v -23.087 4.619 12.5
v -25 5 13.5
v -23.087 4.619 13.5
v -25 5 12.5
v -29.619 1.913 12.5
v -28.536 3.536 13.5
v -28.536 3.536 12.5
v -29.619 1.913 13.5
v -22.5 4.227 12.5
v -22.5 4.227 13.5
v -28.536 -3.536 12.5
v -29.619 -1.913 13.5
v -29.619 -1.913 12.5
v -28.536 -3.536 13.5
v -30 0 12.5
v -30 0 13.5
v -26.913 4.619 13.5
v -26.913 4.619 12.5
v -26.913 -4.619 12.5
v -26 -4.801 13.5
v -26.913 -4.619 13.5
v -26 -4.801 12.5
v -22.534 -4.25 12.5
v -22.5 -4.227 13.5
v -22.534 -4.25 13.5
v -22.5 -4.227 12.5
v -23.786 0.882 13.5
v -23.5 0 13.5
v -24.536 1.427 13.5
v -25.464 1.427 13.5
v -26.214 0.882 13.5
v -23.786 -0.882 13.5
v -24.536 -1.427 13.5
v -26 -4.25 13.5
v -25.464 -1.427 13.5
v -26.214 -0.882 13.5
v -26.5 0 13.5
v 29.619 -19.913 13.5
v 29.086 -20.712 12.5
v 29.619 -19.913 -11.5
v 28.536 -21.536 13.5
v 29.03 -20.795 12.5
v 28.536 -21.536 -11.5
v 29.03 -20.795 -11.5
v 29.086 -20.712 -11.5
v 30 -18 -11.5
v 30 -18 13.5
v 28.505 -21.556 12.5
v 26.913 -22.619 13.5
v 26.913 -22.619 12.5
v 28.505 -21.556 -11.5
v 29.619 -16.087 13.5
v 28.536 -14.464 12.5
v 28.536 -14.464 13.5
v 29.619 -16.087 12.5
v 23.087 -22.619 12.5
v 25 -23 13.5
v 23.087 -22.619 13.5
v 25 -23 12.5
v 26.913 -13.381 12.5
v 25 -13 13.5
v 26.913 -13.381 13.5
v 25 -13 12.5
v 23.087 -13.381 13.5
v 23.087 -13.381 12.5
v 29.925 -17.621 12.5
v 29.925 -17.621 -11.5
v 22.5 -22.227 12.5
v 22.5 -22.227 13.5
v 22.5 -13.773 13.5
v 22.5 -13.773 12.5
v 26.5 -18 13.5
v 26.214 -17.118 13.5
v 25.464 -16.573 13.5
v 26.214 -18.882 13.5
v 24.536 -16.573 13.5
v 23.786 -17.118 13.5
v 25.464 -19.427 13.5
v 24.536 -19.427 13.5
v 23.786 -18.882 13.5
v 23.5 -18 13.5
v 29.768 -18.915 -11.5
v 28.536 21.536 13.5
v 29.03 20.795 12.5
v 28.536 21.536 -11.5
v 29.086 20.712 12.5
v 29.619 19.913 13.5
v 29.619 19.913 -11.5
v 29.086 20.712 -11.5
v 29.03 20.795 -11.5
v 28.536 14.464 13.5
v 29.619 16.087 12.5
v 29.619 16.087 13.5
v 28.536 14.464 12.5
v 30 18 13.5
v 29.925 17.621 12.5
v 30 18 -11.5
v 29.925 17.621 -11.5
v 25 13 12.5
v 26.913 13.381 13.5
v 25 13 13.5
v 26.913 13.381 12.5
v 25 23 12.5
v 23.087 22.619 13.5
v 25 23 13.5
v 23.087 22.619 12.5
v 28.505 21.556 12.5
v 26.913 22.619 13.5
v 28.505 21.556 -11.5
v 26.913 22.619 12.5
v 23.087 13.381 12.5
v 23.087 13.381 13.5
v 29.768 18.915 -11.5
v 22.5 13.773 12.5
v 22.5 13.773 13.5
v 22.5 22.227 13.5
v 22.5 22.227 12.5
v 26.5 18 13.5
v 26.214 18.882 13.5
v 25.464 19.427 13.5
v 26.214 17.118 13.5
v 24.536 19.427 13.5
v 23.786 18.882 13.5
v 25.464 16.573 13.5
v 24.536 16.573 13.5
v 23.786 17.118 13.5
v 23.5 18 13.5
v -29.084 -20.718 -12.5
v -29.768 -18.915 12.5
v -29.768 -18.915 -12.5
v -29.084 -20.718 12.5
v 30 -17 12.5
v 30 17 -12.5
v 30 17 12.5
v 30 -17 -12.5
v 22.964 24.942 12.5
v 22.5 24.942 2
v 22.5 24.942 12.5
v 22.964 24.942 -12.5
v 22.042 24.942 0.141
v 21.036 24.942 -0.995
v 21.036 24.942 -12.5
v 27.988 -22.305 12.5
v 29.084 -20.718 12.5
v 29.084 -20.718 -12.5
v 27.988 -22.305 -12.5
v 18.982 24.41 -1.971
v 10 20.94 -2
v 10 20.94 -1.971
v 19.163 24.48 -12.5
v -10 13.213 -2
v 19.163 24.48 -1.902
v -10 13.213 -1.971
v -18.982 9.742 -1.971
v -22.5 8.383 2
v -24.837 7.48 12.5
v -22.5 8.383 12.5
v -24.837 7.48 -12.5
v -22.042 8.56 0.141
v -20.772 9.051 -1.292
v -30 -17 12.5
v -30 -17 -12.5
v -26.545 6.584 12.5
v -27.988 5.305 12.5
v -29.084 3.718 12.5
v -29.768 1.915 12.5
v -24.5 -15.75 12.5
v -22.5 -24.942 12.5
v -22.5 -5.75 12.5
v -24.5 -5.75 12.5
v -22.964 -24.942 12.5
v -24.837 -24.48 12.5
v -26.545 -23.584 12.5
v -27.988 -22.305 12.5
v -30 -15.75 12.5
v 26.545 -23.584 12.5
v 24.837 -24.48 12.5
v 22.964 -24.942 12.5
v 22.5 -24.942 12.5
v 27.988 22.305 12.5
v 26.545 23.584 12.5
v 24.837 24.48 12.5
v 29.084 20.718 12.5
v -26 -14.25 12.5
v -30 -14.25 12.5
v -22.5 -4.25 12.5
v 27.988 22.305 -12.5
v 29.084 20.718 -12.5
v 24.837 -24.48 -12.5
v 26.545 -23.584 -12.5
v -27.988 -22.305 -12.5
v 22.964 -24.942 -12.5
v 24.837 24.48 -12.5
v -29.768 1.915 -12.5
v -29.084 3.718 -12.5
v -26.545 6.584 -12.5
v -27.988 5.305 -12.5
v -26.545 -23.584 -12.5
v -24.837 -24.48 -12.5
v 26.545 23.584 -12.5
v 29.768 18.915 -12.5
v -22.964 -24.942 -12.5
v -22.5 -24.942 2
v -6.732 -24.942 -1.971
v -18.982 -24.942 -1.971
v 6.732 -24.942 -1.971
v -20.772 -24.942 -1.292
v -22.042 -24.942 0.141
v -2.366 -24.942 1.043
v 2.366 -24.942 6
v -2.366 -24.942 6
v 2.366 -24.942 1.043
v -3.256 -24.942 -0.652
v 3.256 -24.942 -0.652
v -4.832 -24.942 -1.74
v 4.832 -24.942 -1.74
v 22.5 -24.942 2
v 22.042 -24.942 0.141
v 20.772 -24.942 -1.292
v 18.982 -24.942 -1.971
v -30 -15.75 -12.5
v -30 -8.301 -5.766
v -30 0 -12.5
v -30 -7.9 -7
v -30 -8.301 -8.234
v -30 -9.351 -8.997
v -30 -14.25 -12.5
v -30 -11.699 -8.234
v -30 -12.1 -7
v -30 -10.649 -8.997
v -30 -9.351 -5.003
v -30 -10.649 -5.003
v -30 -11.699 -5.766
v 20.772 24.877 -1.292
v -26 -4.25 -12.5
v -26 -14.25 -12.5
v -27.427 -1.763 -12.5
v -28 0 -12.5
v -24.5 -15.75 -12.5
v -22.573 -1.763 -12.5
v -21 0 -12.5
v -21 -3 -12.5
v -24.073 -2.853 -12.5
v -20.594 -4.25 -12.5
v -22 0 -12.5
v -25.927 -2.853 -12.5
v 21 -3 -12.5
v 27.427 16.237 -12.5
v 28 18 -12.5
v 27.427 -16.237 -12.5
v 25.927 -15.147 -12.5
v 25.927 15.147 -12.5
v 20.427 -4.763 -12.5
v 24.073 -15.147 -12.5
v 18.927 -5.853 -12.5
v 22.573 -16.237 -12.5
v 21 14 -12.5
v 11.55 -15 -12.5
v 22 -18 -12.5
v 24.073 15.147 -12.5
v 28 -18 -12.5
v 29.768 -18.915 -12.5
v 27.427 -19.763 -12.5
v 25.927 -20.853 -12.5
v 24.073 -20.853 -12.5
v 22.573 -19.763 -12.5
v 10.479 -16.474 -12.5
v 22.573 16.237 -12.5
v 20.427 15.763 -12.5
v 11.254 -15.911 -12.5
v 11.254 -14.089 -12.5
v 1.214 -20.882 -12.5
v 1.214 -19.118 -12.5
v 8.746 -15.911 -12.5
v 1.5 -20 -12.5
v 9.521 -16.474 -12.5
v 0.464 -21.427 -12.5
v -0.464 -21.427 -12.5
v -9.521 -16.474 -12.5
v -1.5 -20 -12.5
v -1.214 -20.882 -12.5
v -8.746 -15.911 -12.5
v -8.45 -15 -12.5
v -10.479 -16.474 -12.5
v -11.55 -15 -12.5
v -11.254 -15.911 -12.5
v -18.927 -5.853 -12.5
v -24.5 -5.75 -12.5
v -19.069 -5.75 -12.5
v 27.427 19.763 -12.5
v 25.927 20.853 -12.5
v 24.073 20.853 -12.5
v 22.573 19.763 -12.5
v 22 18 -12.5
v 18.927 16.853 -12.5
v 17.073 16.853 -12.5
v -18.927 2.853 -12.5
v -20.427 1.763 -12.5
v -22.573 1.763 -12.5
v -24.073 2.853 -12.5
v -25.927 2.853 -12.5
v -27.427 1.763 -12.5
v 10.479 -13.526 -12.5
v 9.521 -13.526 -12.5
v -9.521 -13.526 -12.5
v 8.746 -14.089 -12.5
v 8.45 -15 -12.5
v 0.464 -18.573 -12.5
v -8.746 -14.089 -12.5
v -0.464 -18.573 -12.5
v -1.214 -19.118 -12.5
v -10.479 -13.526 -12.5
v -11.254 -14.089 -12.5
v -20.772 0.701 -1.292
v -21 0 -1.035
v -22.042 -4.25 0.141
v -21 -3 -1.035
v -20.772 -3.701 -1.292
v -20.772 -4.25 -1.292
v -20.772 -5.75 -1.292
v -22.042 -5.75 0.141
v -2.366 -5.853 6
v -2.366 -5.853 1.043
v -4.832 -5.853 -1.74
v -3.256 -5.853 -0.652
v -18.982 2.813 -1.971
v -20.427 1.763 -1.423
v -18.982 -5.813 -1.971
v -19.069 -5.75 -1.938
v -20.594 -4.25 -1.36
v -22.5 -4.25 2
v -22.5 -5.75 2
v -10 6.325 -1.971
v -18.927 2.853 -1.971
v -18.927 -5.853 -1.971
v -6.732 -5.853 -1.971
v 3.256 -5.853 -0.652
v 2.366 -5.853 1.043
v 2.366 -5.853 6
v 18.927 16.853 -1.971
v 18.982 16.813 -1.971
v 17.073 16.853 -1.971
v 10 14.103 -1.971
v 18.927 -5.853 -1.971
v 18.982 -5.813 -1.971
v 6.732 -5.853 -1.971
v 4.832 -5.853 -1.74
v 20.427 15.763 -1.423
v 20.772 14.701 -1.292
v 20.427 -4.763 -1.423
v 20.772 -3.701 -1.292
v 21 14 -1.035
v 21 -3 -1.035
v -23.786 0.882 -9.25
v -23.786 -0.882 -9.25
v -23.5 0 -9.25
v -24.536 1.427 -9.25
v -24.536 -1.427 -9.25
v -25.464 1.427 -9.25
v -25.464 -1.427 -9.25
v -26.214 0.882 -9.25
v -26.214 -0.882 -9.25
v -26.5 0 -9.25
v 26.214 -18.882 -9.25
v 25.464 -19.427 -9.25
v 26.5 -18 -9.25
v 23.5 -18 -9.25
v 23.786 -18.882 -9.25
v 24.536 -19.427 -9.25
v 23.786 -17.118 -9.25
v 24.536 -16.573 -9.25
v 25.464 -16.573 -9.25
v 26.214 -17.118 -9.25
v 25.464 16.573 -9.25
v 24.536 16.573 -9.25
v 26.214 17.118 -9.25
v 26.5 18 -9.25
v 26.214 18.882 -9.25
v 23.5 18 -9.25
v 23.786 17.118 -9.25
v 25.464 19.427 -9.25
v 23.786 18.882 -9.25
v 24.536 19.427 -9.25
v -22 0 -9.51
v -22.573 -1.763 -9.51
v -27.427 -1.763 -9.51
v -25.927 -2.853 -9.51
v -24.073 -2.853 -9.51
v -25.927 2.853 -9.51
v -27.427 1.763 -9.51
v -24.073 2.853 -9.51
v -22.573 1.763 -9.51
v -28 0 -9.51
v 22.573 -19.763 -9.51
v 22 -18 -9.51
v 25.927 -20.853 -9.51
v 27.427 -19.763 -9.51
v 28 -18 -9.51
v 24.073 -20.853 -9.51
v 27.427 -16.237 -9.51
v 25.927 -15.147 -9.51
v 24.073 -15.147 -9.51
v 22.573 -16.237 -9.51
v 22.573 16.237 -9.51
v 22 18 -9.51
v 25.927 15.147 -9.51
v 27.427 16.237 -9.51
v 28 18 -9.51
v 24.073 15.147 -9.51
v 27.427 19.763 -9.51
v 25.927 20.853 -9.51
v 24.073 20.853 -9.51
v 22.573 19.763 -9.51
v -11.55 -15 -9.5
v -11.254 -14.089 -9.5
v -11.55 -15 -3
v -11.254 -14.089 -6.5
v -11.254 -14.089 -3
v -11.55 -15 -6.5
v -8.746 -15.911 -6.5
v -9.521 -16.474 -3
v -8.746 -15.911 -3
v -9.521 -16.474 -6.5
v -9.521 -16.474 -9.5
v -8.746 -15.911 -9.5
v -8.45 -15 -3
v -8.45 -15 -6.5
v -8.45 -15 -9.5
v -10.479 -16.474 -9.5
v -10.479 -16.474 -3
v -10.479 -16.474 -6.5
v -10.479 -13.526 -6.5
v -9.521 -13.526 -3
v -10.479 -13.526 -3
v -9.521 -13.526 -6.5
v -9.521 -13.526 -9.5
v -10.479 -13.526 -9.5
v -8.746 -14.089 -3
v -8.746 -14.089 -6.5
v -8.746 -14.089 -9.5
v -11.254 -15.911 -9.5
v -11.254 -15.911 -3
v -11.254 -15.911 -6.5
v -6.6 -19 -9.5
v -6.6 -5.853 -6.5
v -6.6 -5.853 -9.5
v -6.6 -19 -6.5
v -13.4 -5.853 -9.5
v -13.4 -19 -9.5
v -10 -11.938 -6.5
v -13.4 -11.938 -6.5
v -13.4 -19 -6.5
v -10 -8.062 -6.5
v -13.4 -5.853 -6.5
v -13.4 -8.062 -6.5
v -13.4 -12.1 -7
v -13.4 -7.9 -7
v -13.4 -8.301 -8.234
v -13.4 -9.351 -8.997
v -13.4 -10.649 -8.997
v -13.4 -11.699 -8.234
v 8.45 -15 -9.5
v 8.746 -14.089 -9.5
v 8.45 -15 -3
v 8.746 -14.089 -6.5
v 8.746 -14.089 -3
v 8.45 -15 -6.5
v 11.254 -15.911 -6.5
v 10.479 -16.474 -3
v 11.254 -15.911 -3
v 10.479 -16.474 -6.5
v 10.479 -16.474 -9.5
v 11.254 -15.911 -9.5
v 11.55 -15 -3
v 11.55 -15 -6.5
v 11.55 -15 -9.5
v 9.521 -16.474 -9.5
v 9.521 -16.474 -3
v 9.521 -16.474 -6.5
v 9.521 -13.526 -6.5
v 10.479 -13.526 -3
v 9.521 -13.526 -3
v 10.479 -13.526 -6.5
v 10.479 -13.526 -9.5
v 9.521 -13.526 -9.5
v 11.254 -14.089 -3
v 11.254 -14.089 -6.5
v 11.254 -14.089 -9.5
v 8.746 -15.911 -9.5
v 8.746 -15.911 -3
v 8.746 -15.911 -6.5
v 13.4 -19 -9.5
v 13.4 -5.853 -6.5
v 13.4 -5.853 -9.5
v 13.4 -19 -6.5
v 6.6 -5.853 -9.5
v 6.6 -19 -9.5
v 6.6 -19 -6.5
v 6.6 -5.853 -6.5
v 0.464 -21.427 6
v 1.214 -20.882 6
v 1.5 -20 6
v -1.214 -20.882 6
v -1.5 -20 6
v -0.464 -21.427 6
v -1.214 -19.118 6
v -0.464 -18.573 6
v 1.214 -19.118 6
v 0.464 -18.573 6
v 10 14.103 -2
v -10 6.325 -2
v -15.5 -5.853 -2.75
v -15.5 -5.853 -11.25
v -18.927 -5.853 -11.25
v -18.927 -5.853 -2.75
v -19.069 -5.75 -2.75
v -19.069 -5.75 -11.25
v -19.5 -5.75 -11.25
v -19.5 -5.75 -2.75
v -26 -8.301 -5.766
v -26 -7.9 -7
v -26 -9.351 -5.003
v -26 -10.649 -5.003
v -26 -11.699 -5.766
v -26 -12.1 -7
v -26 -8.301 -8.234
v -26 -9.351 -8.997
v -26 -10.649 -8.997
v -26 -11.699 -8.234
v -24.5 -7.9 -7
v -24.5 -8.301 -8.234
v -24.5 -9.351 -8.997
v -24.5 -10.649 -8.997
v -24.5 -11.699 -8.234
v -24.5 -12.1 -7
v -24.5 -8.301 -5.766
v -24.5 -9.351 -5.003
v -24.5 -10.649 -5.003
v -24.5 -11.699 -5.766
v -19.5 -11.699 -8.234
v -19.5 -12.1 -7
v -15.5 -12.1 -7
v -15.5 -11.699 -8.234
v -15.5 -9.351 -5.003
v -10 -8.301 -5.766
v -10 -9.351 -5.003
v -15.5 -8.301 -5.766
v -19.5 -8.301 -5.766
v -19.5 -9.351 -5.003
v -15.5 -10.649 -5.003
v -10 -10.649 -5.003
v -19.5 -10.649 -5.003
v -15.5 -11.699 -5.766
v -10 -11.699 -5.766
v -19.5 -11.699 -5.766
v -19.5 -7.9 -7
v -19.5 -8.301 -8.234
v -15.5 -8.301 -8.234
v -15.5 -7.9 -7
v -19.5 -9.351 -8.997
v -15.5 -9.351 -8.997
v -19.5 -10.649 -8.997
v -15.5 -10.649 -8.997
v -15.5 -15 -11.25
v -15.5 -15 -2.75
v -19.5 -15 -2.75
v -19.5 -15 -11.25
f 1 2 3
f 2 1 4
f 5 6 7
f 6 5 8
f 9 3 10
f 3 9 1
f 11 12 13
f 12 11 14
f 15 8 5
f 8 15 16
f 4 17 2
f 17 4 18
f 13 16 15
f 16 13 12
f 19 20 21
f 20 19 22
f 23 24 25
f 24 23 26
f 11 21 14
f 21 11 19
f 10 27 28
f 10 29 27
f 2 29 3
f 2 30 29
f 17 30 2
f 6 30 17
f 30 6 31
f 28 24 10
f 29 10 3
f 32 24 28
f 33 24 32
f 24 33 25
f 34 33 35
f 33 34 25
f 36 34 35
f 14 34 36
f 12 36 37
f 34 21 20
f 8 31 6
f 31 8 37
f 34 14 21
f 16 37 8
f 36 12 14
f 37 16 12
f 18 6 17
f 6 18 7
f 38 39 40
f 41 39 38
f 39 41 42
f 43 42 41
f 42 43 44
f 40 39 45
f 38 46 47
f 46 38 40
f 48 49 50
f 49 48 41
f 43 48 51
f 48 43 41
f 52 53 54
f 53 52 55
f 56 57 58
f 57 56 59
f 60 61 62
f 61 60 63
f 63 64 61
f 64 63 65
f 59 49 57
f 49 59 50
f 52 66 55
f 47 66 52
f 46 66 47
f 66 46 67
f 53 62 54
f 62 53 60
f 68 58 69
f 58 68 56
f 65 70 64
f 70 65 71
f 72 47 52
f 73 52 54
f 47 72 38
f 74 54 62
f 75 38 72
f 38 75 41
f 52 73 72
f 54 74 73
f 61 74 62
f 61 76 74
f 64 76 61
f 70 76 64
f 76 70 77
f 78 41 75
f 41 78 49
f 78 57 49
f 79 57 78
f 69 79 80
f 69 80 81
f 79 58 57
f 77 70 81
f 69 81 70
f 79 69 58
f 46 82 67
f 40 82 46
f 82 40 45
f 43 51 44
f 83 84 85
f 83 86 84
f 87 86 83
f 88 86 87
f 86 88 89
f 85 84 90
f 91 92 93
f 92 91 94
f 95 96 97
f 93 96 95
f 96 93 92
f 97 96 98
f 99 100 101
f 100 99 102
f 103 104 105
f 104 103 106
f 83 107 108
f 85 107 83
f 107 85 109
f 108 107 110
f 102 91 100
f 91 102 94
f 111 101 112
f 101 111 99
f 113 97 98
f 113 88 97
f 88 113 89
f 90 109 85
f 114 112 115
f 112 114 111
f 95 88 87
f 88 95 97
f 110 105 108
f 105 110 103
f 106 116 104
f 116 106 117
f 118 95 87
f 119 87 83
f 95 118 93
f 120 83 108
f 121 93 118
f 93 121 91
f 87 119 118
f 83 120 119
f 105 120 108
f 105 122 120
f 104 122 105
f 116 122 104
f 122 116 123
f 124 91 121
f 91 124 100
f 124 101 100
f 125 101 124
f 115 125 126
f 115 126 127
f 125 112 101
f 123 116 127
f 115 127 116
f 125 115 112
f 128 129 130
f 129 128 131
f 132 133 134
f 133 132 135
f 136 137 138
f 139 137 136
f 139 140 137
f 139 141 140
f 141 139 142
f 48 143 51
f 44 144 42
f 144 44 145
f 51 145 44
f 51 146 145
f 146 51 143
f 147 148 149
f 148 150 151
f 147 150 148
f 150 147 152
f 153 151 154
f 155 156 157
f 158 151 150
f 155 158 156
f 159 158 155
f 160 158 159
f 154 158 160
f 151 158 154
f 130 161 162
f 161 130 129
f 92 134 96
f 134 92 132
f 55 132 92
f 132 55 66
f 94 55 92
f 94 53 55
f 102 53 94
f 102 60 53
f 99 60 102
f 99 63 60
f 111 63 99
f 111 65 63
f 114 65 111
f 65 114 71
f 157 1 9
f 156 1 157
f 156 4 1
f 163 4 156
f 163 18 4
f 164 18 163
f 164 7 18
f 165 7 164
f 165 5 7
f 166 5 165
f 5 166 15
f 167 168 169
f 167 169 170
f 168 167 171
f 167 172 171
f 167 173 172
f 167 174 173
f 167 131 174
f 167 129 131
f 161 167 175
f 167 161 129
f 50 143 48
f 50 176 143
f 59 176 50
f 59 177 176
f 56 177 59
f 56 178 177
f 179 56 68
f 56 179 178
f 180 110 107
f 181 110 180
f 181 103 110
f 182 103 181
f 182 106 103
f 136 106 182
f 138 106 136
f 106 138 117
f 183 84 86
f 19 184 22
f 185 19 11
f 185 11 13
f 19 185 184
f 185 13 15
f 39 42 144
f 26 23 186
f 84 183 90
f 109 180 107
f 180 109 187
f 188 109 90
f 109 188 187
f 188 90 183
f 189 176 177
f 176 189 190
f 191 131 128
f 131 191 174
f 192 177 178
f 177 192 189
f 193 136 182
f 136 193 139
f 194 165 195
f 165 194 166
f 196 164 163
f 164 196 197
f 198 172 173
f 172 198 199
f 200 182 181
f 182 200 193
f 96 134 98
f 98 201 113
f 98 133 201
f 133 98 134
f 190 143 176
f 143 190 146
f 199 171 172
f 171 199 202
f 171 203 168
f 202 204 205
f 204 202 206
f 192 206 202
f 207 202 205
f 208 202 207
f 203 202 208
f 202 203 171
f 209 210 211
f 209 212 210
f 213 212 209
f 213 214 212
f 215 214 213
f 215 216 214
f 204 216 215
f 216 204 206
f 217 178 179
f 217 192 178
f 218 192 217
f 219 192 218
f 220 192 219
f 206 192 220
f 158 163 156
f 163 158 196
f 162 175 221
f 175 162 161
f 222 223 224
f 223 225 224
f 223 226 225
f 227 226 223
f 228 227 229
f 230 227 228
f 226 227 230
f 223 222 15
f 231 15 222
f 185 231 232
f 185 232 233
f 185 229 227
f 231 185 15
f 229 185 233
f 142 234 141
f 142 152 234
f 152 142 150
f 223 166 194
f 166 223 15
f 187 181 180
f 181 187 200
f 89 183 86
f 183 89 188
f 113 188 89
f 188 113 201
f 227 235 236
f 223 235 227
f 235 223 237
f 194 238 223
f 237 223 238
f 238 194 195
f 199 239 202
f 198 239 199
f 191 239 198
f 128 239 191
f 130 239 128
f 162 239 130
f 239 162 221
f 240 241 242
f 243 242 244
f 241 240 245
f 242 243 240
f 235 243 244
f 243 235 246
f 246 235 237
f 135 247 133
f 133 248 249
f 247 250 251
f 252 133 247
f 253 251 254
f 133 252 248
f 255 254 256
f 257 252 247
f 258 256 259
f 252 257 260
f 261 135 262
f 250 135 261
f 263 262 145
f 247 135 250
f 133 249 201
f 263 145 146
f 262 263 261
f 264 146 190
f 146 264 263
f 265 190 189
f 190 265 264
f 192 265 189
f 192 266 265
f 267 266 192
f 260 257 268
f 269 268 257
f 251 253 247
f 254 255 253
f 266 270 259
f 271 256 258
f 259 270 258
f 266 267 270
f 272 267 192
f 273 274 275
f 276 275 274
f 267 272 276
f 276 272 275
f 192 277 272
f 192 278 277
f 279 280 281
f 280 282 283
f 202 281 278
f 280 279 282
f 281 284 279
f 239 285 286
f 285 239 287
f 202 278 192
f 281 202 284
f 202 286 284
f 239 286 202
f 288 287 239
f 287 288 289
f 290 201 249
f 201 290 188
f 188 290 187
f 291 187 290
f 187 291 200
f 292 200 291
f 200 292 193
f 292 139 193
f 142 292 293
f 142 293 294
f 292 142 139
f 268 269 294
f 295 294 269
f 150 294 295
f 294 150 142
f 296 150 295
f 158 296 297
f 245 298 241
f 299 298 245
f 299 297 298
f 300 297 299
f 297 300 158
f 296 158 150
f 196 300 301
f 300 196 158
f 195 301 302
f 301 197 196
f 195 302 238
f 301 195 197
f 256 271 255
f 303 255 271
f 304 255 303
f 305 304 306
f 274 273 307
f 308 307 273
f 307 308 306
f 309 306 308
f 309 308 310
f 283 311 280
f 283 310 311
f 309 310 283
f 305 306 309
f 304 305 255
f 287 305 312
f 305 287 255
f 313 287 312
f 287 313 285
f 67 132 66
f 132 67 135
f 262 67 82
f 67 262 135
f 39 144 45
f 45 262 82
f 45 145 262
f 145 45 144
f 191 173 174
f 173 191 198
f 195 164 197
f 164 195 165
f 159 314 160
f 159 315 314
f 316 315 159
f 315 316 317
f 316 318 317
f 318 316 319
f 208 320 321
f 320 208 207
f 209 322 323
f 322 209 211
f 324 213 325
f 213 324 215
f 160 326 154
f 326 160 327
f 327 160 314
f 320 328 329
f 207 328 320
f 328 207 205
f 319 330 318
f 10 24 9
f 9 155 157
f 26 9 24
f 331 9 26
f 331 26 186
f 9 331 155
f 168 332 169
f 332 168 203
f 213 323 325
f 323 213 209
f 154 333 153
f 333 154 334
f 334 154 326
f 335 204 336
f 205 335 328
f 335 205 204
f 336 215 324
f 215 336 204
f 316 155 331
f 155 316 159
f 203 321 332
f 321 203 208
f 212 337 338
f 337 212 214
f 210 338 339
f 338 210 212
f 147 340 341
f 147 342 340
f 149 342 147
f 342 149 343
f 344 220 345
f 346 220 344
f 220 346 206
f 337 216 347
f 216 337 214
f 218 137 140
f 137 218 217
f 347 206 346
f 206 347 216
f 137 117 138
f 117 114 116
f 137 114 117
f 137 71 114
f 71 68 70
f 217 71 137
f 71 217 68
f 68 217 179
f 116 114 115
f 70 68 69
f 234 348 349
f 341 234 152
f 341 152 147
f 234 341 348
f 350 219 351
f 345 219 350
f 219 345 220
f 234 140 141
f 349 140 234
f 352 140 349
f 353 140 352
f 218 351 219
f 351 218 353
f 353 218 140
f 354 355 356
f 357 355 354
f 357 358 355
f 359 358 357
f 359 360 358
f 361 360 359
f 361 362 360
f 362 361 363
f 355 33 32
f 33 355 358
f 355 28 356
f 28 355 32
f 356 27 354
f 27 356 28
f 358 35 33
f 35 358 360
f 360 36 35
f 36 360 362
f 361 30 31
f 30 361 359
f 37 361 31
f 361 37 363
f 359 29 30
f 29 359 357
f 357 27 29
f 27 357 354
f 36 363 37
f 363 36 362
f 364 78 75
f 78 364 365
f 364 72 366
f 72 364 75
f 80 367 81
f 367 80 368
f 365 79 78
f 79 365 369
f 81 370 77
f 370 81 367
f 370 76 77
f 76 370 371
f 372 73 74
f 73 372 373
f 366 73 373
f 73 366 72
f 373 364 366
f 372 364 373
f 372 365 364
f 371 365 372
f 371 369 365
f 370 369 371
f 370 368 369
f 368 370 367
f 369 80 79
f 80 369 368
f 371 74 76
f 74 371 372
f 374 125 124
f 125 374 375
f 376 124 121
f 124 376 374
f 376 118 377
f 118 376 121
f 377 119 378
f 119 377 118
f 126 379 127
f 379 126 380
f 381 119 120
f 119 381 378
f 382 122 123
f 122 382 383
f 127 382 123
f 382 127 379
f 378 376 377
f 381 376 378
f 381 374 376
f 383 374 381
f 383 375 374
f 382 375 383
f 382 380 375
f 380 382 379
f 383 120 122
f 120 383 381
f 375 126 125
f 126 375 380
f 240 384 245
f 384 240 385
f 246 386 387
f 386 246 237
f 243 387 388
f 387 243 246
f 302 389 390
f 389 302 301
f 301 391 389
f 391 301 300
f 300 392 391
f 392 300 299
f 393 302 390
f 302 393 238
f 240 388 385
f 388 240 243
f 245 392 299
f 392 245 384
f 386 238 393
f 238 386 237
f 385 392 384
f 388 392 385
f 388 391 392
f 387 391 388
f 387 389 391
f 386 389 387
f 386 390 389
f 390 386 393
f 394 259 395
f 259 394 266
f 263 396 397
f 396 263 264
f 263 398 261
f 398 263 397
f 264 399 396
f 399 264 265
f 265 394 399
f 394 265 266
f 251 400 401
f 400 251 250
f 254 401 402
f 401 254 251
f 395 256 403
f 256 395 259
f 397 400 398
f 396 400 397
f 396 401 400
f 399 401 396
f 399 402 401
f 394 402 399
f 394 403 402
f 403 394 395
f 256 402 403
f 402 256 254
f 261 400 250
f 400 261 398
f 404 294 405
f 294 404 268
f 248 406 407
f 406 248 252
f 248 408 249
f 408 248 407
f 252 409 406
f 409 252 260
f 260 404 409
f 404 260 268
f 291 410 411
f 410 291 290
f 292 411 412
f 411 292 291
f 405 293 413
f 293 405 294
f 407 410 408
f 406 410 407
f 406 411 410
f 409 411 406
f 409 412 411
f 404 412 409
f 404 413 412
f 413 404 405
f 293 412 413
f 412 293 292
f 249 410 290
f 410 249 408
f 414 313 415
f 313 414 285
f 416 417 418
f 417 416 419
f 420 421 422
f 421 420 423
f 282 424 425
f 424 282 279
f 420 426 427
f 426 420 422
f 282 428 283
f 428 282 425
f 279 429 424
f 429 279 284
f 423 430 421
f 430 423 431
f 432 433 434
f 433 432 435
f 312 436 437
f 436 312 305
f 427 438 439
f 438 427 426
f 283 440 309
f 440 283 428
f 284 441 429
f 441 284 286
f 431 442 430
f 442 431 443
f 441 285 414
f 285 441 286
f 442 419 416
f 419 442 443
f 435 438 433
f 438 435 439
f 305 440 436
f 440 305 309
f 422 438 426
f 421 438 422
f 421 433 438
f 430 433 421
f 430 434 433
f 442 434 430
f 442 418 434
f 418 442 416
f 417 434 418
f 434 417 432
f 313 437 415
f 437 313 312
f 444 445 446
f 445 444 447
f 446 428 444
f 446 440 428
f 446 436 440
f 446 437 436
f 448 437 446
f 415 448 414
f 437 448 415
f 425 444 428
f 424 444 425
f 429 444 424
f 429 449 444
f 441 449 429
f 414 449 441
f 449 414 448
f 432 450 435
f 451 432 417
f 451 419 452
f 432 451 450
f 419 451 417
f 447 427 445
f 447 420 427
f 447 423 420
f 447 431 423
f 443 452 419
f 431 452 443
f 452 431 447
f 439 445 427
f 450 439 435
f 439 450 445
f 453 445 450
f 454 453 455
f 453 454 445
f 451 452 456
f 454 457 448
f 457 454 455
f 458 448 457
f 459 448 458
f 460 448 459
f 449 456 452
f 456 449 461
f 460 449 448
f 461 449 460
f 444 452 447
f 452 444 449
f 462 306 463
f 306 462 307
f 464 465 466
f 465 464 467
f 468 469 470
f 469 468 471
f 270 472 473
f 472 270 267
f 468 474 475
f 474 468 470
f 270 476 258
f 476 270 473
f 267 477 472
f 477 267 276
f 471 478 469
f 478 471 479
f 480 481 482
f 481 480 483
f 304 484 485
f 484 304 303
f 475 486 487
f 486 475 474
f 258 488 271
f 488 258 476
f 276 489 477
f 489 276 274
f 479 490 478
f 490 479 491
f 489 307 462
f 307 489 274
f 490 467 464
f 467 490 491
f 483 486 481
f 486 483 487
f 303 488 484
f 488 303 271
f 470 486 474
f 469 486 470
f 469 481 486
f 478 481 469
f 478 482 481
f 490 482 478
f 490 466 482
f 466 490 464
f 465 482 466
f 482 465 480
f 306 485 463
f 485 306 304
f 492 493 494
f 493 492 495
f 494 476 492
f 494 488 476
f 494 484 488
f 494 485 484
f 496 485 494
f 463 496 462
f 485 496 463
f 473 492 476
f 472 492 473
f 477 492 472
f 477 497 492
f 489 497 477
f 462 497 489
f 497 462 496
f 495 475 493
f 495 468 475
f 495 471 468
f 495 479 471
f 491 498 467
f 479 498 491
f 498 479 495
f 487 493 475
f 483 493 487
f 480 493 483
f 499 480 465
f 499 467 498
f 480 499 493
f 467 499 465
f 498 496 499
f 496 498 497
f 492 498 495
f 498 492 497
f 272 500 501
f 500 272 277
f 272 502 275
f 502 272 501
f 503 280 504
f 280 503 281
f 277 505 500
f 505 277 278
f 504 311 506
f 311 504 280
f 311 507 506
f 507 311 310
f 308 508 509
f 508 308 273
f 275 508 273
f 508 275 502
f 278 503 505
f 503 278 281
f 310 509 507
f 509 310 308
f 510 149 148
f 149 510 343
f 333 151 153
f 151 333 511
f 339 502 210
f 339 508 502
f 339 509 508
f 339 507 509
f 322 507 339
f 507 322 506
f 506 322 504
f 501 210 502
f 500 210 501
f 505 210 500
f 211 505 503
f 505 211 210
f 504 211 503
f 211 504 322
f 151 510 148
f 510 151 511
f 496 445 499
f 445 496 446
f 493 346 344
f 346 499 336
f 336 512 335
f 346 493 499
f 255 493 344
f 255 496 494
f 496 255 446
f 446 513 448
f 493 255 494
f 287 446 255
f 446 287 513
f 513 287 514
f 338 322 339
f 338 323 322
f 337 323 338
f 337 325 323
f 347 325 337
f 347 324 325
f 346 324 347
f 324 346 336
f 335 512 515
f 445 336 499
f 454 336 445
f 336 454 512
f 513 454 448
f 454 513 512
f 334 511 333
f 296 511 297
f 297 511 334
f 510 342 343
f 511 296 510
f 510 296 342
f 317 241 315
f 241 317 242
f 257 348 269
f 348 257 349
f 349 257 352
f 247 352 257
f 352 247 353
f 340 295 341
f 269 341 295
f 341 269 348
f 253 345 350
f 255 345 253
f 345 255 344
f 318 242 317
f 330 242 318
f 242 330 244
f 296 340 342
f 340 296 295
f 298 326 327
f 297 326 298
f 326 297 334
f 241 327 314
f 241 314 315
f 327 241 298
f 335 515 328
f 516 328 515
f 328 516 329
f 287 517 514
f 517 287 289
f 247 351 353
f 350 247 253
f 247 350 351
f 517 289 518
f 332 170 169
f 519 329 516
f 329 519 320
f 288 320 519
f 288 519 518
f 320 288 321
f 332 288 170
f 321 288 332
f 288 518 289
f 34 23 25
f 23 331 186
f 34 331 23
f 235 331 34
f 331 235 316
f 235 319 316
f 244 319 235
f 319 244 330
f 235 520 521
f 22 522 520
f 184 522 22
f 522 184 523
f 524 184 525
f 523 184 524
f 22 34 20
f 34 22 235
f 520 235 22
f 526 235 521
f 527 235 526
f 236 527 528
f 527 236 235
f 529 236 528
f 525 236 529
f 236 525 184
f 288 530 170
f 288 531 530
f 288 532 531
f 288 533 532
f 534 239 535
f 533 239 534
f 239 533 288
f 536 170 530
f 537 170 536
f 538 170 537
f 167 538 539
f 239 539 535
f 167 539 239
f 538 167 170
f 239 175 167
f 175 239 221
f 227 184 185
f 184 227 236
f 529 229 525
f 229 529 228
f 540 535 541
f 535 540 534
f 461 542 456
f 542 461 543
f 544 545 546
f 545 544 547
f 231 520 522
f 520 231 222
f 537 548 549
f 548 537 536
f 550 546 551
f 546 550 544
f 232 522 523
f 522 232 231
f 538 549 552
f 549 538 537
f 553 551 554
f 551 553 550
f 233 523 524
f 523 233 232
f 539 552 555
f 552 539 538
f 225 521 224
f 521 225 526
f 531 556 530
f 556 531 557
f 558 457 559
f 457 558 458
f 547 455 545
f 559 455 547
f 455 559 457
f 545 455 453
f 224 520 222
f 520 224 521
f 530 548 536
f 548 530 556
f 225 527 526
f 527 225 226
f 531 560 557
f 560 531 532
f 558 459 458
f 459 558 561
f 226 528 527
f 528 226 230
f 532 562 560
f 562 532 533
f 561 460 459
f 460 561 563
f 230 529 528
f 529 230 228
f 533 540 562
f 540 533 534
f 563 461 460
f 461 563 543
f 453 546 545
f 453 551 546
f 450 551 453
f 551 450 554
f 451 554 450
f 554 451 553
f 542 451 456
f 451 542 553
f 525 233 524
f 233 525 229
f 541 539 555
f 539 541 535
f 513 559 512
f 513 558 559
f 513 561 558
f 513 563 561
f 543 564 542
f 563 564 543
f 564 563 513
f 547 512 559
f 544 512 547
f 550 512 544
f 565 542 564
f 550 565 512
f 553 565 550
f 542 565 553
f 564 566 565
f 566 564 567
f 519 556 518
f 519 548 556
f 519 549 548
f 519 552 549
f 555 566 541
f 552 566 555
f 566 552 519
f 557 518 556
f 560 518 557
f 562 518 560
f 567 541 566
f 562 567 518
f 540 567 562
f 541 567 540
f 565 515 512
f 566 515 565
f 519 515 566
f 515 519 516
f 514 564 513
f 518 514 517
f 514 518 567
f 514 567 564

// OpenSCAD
// file: metric-cerberus.scad
include <config.scad>

module extrusion4040(h=1000) {
  translate([-20,-20,0])
    linear_extrude(height=h) import("extrusion.dxf");
}

module endstop(h = endstop_height, w = endstop_width, d = endstop_depth,
               r = endstop_hole_diameter/2, ehh = endstop_hole_height,
               ehw = endstop_hole_width,
               eth = endstop_trigger_height, etw = endstop_trigger_width,
               etd = endstop_trigger_depth, eto = endstop_trigger_offset,
               ) {
  difference() {
    translate([0, 0, h/2]) cube([w, d, h], center = true);
    for (i=[1,-1])
      translate([i*endstop_hole_width, 0, ehh])
        rotate([90,0,0]) cylinder(r = r, h = endstop_depth+1, center = true, $fn = 12);
  }
  translate([eto, 0, h+eth/2]) color("Red")
    cube([etw, etd, eth], center = true);
}

module mushroom(min_slot_width = 7.5, max_slot_width = 9,
                slot_depth = 5, inner_width = 12,
                mushroom_depth = 11.75, mushroom_depth_1 = 7,
                mushroom_depth_2 = 9.5, mushroom_width_2 = 15.5,
                max_mushroom_width = 18.5, min_mushroom_width = 10,
                mushroom_lip_width = 2,
                mushroom_lip_depth = 1,
                width = 40, h = 40, margin = .5) {
  translate([0, -width/2, 0])
  linear_extrude(h=h, convexity = 8)
    polygon(points=[
      [-(max_slot_width/2+margin), 0-margin],
      [-min_slot_width/2, (max_slot_width-min_slot_width)/2],
      [-min_slot_width/2, slot_depth-(max_slot_width-min_slot_width)/2],
      [-max_slot_width/2, slot_depth],

      [-(max_mushroom_width/2-mushroom_lip_width), slot_depth],
      [-(max_mushroom_width/2-mushroom_lip_width), slot_depth-mushroom_lip_depth],
      [-max_mushroom_width/2, slot_depth-mushroom_lip_depth],

      [-max_mushroom_width/2, mushroom_depth_1],
      [-mushroom_width_2/2, mushroom_depth_2],
      [-min_mushroom_width/2, mushroom_depth],

      [min_mushroom_width/2, mushroom_depth],
      [mushroom_width_2/2, mushroom_depth_2],
      [max_mushroom_width/2, mushroom_depth_1],

      [max_mushroom_width/2, slot_depth-mushroom_lip_depth],
      [(max_mushroom_width/2-mushroom_lip_width), slot_depth-mushroom_lip_depth],
      [(max_mushroom_width/2-mushroom_lip_width), slot_depth],
      [max_slot_width/2, slot_depth],
      [min_slot_width/2, slot_depth-(max_slot_width-min_slot_width)/2],
      [min_slot_width/2,  (max_slot_width-min_slot_width)/2],
      [(max_slot_width/2+margin), 0-margin],
    ]);
}

module extrusion4040_no_hole(h=40, corner_radius = 4, width = 40,
                             mushroom_angles = [0, 90, 180, 270]) {
  half = width/2;
  offset = half-corner_radius;
  difference() {
    hull() {
      for (i=[1,-1]) {
        for (j=[1,-1]) {
          translate([i*offset*extrusion_scale, j*offset*extrusion_scale, 0])
            cylinder(r=corner_radius*extrusion_scale, h = h, $fn = 30);
        }
      }
    }
    for (r=mushroom_angles) {
      rotate([0,0,r]) translate([0,0,-.5]) mushroom(h=h+1);
    }
  }
}

module fixing_bar(length = 320, height = 25, thickness = 2.5,
                  hole_radius = 4.2/2, hole_offset = 19) {
  rotate([0, 0, -30])
    translate([-(thickness/2+20.2), -(length/2+8.5), height/2])
      difference() {
        cube([thickness, length, height], center = true);
        for (i=[1,-1]) {
          translate([0,i*(length/2-hole_offset),0])
            rotate([0,90,0])
              cylinder(r=hole_radius, h=thickness+2, center = true, $fn = 24);
        }
      }
}

module slots_for_bars(h = 25.8, hole_diameter = 4.2) {

  for (i=[1,-1]) {
    // slots for bars
    rotate([0, 0, i*30]) translate([i*21.5, -57.5, h/2])
      cube([3, 100, h], center = true);

    // cutouts beside bars
    rotate([0, 0, i*30]) translate([i*26, -65, h/2])
      cube([10, 100, h], center = true);

    // holes to secure bar
    translate([i*30.95, -13.95, h/2])
      rotate([0, 90, i*30])
        cylinder(r=hole_diameter/2, h=38, $fn = 12, center = true);
  }
}

module tripod_cutout(h=20) { // used by upper bracket
  translate([0,-25,h/2+15.6]) cube([30,20,h], center = true);
  difference() {
    translate([0,-19,h/2 + 15.6]) cube([40,10,h], center = true);
    translate([21.5,-19,(h+2)/2 + 15.6]) rotate([0,0,30]) cube([10,10,h+2], center = true);
    translate([-21.5,-19,(h+2)/2 + 15.6]) rotate([0,0,-30]) cube([10,10,h+2], center = true);
  }
}

module outer_brace_upper_bracket(h = outer_brace_upper_bracket_height,
                                 endstop_hole_width = endstop_hole_width,
                                 endstop_hole_diameter = endstop_hole_diameter)
{
  difference() {
    union() {
      translate([0, -.5, h/2])
        cylinder(r=32, h = h, center = true);
      for (i=[1,-1])
        rotate([0,0,i*30]) translate([0, -20, h/2])
          cube([46, 55, h], center = true);
    }

    // cut for extrusion
    translate([0, 0, -1])
      extrusion4040_no_hole(h=40, mushroom_angles = [90,180,270]);

    // cut to form outer face
    translate([0, 47, 29]) cube([100, 40, 60], center=true);

    // cut to form inner face
    translate([0, -47, 29]) cube([100, 40, 60], center=true);

    // cut to form top face
    translate([0, 100/2-40/2, 60/2+h]) cube([100, 100, 60], center=true);

    translate([0, 0, 5.3]) slots_for_bars();

    // end stop holes
    for (i=[1,-1]) {
      translate([i*endstop_hole_width+endstop_trigger_offset, -15, 3.7])
        rotate([90,0,0]) cylinder(r=endstop_hole_diameter/2, h=20, $fn=12);
    }

    // other holes
    translate([-13,-15,10.5]) rotate([90,0,0]) cylinder(r=1.5, h=20, $fn=12);
    translate([13,-15,10.5]) rotate([90,0,0]) cylinder(r=1.5, h=20, $fn=12);

    // cutout for tripod
    tripod_cutout(h=21);
  }
}

module outer_brace_bottom_bracket(h = 38) {
  difference() {
    union() {
      translate([0, -.5, 22.5])
        cylinder(r=32, h = 45, center = true);
      for (i=[1,-1])
        rotate([0,0,i*30]) translate([0, -20, 19])
          cube([46, 55, 38], center = true);
    }

    // cut for extrusion
    translate([0, 0, base_thickness]) extrusion4040_no_hole(h=60);

    // cut to form outer face
    translate([0, 47, 29]) cube([100, 40, 60], center=true);

    // cut to form inner face
    translate([0, -47, 29]) cube([100, 40, 60], center=true);

    // cut to form top face
    for (i=[-1,1]) {
      translate([i*43, 100/2-40/2, 60/2+38.1]) rotate([0,0,i*45])
        cube([100, 100, 60], center=true);
    }

    translate([0, 0, 7.6]) slots_for_bars();
  }
}

module outer_brace_bottom_jig(h = 25.4, hole_diameter = 4.2) {
  intersection() {
    difference() {
      outer_brace_bottom_bracket();
      translate([500,0,500-.1]) cube([1000,1000,1000], center = true);
      translate([-30.95, -13.95, 7.6+h/2])
        rotate([0, 90, -30])
        cylinder(r=hole_diameter/2, h=100, $fn = 12, center = true);

    }
    translate([-30.95, -13.95, 7.6+h/2])
      rotate([0, 90, -30])
        translate([0,2,12]) cube([10,6,24], center = true);
  }
  translate([-30.95, -13.95, 0])
    rotate([0, 0, -30]) {
      translate([3,0,(7.6+h/2)/2-2]) cube([6,2,7.6+h/2-4], center = true);
      translate([21,0,(7.6+h/2)/2-2]) cube([6,2,7.6+h/2-4], center = true);
      translate([12, 1.5, -1]) cube([24,5,2], center = true);
    }
}

module upper_idler_adjuster_body(h = 60) {
  
  corner_radius=4;
  width=40;
  half_width=width/2;
  offset = half_width-corner_radius;

  difference() {
    // main block
    hull() {
      for (a=[[offset, offset, h/2],[offset, -offset, h/2],
              [-offset, -offset, h/2],[-offset, offset, h/2]]) {
        translate(a) cylinder(r=4, h=h, center = true);
      }
    }
    // cut for extrusion
    translate([0, 0, h-10]) extrusion4040_no_hole(h=h);

    // hollow
    difference() {
      translate([-4.95, 0, 3+(50+30)/2]) cube([26.75,21,50+30], center = true);
      for (i=[-1,1])
        translate([-4.95, i*(8/2+4.8), 3+(50+30)/2]) cube([4.5,8,50+30], center = true);
    }
    // hole
    translate([-12.8,0,0]) cylinder(r=2, h=10, center = true, $fn = 12);

    // slot
    translate([-19,0,20]) {
      translate([0, 0, 100/2]) cube([5, 8, 100], center = true);
      rotate([0,90,0]) cylinder(r = 4, h = 5, center = true, $fn=24);
    }
    translate([-8, 0, h]) cube([26.75,21,20], center = true);

  }
}

module upper_idler_adjuster_axle(h = 16, r = 4, base_r = 10, base_h = 1) {
  cylinder(r=base_r, h=base_h);
  cylinder(r=r, h=h);
}

module tripod_brace_bottom_to_print() {
    import("Cerberus/stl/Tripod Brace Bott with Motor Mount - for snap fit lower idler.stl");
}

module tripod_brace_bottom() {
  rotate([0,180,0])
    translate([-54.25,-57,-30])
    import("Cerberus/stl/Tripod Brace Bott with Motor Mount - for snap fit lower idler.stl");
}

module tripod_brace_top() {
  rotate([0,0,-43.4])
    translate([-81.35,64,0])
    import("Cerberus/stl/Tripod Brace Top v2.stl");
}

module vert_carriage_for_623_dual_bearing_roller_to_print() {
  import("Cerberus/stl/Vert carriage for 623 Dual Bearing Roller.stl");
}

module vert_carriage_for_623_dual_bearing_roller() {
  rotate([0,0,180]) translate([-5.5, 32, 0]) rotate([90, 0, 0])
    import("Cerberus/stl/Vert carriage for 623 Dual Bearing Roller.stl");
}

module tripod_hole_jig(h = 15+(45-base_thickness),
                       r = 5.2/2, w = 40) {
  difference() {
    union() {
      difference() {
        cube([w+4, h+r+base_thickness+2, 8], center = true);
        translate([0, 1.5, base_thickness])
          cube([w*extrusion_scale, h+r+2+1, 6], center = true);
      }
      cube([7.5, h+r+base_thickness+2, 8], center = true);
    }
    translate([0, h/2-2, 0]) cylinder(r = r, h = 20, $fn = 18, center = true);
  }
}
// file: config.scad
diameter=392;
bar_length=.95*cos(30)*diameter; // 322
bar_height=25;
bar_scale = 1.02; // allow extra space to fit
bar_thickness=2.5;
extrusion_length = 1000;
extrusion_width = 40;
extrusion_scale = 1.02; // allow extra space to fit

// outer brace upper bracket configuration
outer_brace_upper_bracket_height = 35.6;
endstop_hole_diameter = 2.2; // should be drill size but slightly bigger works
// distance from center of hole to center of endstop
endstop_hole_width = 4.75;
// distance from center of trigger to center of endstop
endstop_trigger_offset = 3.125;

// these are not required for printing just for the model
endstop_hole_height = 1.5+2.5/2;
endstop_width = 20;
endstop_height = 10.75;
endstop_depth = 6.5;
endstop_trigger_width = 1.75;
endstop_trigger_height = 1.25;
endstop_trigger_depth = 2.5;

// outer brace bottom bracket configuration
base_thickness = 2.55; // height of bottom of extrusion above ground
// main file
// EXPERIMENTAL: DO NOT PRINT UNLESS YOU ARE HAPPY TO WASTE PLASTIC
// EXPERIMENTAL: DO NOT PRINT UNLESS YOU ARE HAPPY TO WASTE PLASTIC
// EXPERIMENTAL: DO NOT PRINT UNLESS YOU ARE HAPPY TO WASTE PLASTIC
// EXPERIMENTAL: DO NOT PRINT UNLESS YOU ARE HAPPY TO WASTE PLASTIC

include <config.scad>;
use <metric-cerberus.scad>;
to_print = 1;
layer_height = .25; // to add a layer of bridging support to the bearing holes
roller_diameter = 13.3; // on flat part
roller_width = 11;

if (0) {
  translate([0,19.5,2]) #vert_carriage_for_623_dual_bearing_roller();
}

module vert_carriage(extrusion_width = 40, spacing = 2.5, curvature = 8)
{
  width = extrusion_width+20;
  height = 50;
  depth = 25;
  hole_offset = extrusion_width/2+5;
  vert_hole_offset = 36;
  cut_width = extrusion_width+spacing;
  center_width = 4.5;
  adjustment_slit_width = 1.5;
  end_stop_block_width = 25;
  end_stop_screw_hole_diameter = 0; // 3.5mm (m4 tap) or 0 (no hole)
  end_stop_block = 0;

  difference() {

    union() {
      // main body
      hull() {
        translate([(width/2-curvature), 0, 1*(height/2-curvature)])
          rotate([90,0,0]) cylinder(r=curvature, h = depth, center = true);
        translate([(width/2-curvature), 0, -1*(height/2-curvature)])
          rotate([90,0,0]) cylinder(r=curvature, h = depth, center = true);
        translate([-(width/2-curvature), 0, (height/2-curvature)])
          rotate([90,0,0]) cylinder(r=curvature, h = depth, center = true);
        translate([-(width/2-curvature), 0, 0*(height/2-curvature)])
          rotate([90,0,0]) cylinder(r=curvature, h = depth, center = true);
      }

      // end stop screw block
      if (end_stop_block) {
        translate([0, -4, 18])
          cube([end_stop_block_width, 17, 26], center = true);
      }

      // bearing supports
      for (t = [[-1*hole_offset, 0, 0],
                [hole_offset, vert_hole_offset*.5, 0],
                [hole_offset, vert_hole_offset*-.5, 0]]) {
        translate([0, 1, 0])
        rotate([90, 0, 0])
          translate(t) cylinder(r = 5, h = depth, center = true);

        // roller
        translate([0, 1.5+(roller_width+depth)/2, 0]) {
          rotate([90, 0, 0]) {
            translate(t) {
              %cylinder(r = roller_diameter/2,
                h = roller_width, center = true);
            }
          }
        }
      }
    }

    if (end_stop_screw_hole_diameter != 0) {
      // end stop screw hole
      translate([0,-8.5, 28])
        cylinder(r=3.5/2, h = 10, center = true, $fn=10);
    }

    // filament/bracket screw
    translate([0, 0, 20]) rotate([90,0,0])
        cylinder(r=3/2, h = depth+2, center = true, $fn=10);


    // clear middle
    translate([0, 16, 0]) cube([20, 20, height+2], center = true);

    // clear middle bottom
    translate([0, 18, -14])
      cube([20, extrusion_width, height-14], center = true);

    // clear extrusion curves
    for (i=[-1,1]) {
      scale([i,1,1]) {
        hull() {
          for (j=[(extrusion_width/2-4+spacing), center_width/2+4]) {
            for (k=[-1,1]) {
              translate([j, 12+k*10, 0])
                cylinder(r=4, h = height+20, center = true);
            }
          }
        }
      }
    }

    // bearing holes
    for (t = [[-1*hole_offset, layer_height+3, 0 ],
              [hole_offset, layer_height+3, vert_hole_offset*.5],
              [hole_offset, layer_height+3, vert_hole_offset*-.5]]) {
      translate(t) rotate([90, 0, 0])
        cylinder(r = 3/2, h = depth, center = true, $fn = 10);
    }

    // bearing holes sink heads
    for (t = [[-1*hole_offset, -depth/2+1.49, 0],
              [hole_offset, -depth/2+1.49, vert_hole_offset*.5],
              [hole_offset, -depth/2+1.49, vert_hole_offset*-.5]]) {
      translate(t) rotate([90, 0, 0])
        cylinder(r = 3, h = 3, center = true, $fn = 10);
    }

    // cut out middle
    hull() {
      for (t = [[width/2-12, 0, 3], [12-width/2, 0, 3],
                [width/2-12, 0, -14], [12-width/2, 0, 0]]) {
        translate(t)
          rotate([90, 0, 0]) cylinder(r=3, h=depth+10, center = true);
      }
    }

    // adjustment slit
    translate([-width/2+9, 0, 5])
      cube([10, depth*2, adjustment_slit_width], center = true);
    translate([-width/2+0.5, 0, 15])
      cube([10, depth*2, adjustment_slit_width], center = true);
    translate([-width/2+4.75, 0, 10])
      cube([adjustment_slit_width, depth*2, 10], center = true);

    // adjustment screw hole
    translate([-width/2, -7, 10])
      rotate([0,90,0]) cylinder(r=4.2/2, h = 40, center = true, $fn=10);

    // m4 nut trap
    translate([-width/2+12.5, -7, 10])
      cube([4, 8.5, 10], center = true);

    // mounting holes for carriage bracket
    // spacing is middle then 10 across and 5 down for each hole
    for (t = [[-10, -8, 15],
              [10, -8, 15]]) {
      translate(t) rotate([90,0,0]) {
        cylinder(r=3.1/2, h = 10, center = true, $fn=10);

        // m3 nut trap - trap needs translation of -(15-6.8)/2 = -4.1
        // so use -3.5 just to be safe
        translate([0, -3.5, 0]) cube([6.8, 15, 3], center = true);
      }
    }
  }
}

// rotate to print
rotate([to_print ? 90 : 0, 0, 0]) {

  // the part
  vert_carriage();

  // extrusion
  %translate([0,19.5,-40]) extrusion4040(h=80);

  //testfit carriage bracket
  //include <carriage-bracket.scad>;
}
